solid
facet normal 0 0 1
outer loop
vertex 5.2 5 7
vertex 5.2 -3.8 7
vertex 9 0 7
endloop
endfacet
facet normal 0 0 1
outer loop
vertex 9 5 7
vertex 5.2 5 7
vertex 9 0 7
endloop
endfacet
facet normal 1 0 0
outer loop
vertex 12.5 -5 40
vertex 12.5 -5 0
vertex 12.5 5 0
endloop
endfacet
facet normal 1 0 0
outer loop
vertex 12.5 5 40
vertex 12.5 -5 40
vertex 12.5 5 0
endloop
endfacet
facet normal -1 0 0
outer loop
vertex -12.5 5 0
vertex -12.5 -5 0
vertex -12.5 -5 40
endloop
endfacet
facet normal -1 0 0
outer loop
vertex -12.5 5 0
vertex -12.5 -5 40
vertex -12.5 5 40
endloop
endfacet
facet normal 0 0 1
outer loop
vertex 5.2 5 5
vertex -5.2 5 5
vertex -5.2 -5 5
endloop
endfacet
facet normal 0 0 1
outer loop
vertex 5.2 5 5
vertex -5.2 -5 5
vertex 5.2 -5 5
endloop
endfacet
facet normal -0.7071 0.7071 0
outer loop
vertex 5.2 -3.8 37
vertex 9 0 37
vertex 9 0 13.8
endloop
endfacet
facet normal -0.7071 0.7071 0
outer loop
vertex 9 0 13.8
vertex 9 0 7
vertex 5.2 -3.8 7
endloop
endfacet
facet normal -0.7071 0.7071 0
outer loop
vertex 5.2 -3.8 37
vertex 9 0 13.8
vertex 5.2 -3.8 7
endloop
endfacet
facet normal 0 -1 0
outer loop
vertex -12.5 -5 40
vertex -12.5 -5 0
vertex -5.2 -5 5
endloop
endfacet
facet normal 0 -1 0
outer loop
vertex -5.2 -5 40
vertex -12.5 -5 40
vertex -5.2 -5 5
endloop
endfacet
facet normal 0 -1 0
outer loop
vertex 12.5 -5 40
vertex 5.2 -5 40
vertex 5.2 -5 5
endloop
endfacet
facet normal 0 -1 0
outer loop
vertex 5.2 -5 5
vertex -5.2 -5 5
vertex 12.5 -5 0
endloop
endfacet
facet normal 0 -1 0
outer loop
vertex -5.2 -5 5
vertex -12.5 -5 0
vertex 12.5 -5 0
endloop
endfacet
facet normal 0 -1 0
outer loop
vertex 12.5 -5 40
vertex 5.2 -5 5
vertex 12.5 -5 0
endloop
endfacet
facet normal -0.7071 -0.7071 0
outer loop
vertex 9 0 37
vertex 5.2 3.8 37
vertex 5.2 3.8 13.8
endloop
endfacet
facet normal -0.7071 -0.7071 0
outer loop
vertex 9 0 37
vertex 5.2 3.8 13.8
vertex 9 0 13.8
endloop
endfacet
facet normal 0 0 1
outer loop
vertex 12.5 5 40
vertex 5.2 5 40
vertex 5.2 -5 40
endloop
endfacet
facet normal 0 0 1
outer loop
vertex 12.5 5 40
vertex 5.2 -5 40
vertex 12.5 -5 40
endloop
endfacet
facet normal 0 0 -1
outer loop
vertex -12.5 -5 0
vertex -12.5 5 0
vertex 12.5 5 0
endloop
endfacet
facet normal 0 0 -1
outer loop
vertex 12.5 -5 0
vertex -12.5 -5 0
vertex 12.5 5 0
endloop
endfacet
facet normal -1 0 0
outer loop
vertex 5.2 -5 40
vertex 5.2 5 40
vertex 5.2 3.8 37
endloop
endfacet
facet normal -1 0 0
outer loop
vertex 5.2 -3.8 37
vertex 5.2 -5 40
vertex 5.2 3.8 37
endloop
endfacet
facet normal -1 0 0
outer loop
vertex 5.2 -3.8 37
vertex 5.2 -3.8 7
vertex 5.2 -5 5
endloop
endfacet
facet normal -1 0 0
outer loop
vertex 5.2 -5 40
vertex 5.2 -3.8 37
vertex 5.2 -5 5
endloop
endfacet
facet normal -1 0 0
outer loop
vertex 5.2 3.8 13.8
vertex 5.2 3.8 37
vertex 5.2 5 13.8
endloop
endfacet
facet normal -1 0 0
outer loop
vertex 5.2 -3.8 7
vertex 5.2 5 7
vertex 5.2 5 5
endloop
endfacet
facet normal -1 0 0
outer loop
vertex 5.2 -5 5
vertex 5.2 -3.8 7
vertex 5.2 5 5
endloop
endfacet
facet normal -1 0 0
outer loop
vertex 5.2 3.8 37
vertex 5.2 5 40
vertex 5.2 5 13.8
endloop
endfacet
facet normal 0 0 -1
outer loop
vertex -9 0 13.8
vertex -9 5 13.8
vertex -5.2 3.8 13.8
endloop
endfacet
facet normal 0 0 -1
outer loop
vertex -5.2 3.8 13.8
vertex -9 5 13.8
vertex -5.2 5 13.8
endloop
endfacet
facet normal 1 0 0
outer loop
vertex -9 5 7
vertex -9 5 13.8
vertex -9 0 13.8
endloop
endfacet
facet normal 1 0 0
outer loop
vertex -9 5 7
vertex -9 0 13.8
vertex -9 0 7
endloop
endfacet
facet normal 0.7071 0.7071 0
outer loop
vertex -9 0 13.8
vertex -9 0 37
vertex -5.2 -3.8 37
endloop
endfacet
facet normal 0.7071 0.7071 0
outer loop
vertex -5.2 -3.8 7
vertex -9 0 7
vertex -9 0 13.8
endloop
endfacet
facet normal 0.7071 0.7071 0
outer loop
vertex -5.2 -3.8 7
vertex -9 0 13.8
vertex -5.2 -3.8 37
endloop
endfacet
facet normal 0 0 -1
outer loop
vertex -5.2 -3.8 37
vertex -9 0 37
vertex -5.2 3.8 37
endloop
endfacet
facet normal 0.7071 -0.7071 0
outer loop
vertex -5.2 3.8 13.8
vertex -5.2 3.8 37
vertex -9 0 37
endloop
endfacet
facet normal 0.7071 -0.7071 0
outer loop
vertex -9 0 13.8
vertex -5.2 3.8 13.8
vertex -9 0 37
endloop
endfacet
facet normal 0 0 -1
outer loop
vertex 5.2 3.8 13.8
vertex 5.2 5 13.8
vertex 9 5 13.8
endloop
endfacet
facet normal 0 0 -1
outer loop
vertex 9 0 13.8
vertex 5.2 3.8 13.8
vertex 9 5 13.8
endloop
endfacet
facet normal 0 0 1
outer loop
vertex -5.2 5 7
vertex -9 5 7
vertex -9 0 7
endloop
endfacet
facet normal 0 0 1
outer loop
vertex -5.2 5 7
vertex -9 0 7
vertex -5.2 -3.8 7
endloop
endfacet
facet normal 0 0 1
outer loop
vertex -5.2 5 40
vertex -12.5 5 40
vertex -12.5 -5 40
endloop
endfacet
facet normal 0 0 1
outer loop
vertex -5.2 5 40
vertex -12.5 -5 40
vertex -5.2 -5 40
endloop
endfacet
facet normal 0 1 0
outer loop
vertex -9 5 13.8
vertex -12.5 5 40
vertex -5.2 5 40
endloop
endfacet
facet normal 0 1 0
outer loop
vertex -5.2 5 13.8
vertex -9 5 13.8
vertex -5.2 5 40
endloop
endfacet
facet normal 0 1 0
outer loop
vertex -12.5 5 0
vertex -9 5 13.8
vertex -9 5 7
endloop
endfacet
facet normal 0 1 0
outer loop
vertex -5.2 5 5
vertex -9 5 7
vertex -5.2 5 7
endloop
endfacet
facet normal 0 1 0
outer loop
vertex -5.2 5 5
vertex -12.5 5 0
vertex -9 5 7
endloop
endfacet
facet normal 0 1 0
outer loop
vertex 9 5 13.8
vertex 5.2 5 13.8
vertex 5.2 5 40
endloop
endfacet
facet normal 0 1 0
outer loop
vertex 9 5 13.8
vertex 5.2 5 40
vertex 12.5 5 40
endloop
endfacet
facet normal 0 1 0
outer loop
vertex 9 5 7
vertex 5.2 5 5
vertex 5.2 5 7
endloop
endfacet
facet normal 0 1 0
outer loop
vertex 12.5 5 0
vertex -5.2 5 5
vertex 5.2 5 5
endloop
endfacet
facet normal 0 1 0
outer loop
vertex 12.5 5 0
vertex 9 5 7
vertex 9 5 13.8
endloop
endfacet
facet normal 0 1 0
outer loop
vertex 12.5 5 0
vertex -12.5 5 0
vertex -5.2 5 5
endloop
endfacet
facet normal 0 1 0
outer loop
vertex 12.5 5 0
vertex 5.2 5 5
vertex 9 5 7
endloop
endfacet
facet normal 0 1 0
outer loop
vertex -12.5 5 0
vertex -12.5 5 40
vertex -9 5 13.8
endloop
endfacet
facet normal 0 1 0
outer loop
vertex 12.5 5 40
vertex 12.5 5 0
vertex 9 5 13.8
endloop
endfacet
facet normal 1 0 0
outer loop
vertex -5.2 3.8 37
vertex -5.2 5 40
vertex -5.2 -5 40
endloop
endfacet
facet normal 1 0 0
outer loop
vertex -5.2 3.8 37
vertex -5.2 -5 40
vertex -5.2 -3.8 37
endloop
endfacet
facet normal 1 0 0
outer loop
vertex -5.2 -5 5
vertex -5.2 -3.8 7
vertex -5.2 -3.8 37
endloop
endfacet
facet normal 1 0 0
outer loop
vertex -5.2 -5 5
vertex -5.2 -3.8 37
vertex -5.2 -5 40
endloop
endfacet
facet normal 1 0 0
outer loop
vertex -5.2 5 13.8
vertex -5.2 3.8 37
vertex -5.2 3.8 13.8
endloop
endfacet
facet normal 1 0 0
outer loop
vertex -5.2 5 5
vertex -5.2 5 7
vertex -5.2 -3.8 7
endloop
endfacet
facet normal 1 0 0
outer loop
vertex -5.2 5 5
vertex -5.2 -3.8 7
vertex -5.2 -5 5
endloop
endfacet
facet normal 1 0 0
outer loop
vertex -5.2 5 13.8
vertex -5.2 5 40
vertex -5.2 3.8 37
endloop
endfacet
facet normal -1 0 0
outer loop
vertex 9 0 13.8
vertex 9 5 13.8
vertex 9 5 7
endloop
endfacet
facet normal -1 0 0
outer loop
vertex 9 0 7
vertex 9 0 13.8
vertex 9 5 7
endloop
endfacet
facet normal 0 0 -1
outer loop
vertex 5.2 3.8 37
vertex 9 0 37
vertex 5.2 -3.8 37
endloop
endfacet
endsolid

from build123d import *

# Parameters (mm, degrees)
SKETCH2_W           = 25
SKETCH2_H           = 10
BOSS_EXTRUDE1_DEPTH = 40
SKETCH3_W           = 10.4
SKETCH3_H           = 35
CUT_EXTRUDE1_DEPTH  = 44.084219849
SKETCH4_W           = 18
SKETCH4_H           = 6.8
CUT_EXTRUDE2_DEPTH  = 5
CUT_EXTRUDE3_DEPTH  = 30


with BuildPart() as part:
    # Sketch2 → Boss-Extrude1 (new body)
    with BuildSketch(Plane.XY):
        Rectangle(SKETCH2_W, SKETCH2_H)
    extrude(amount=BOSS_EXTRUDE1_DEPTH)

    # Sketch3 → Cut-Extrude1 (cut, through all)
    with BuildSketch(Plane(origin=(0, 5, 0), x_dir=(1, 0, 0), z_dir=(0, 1, 0))):
        with Locations((0, -22.5)):
            Rectangle(SKETCH3_W, SKETCH3_H)
    extrude(amount=-CUT_EXTRUDE1_DEPTH, mode=Mode.SUBTRACT)

    # Sketch4 → Cut-Extrude2 (cut)
    with BuildSketch(Plane(origin=(0, 5, 0), x_dir=(1, 0, 0), z_dir=(0, 1, 0))):
        with Locations((0, -10.4)):
            Rectangle(SKETCH4_W, SKETCH4_H)
    extrude(amount=-CUT_EXTRUDE2_DEPTH, mode=Mode.SUBTRACT)

    # Sketch5 → Cut-Extrude3 (cut)
    with BuildSketch(Plane.XY.offset(7)):
        Polygon((5.2, 3.8), (9, 0), (5.2, -3.8), align=None)
        Polygon((-5.2, -3.8), (-5.2, 3.8), (-9, 0), align=None)
    extrude(amount=CUT_EXTRUDE3_DEPTH, mode=Mode.SUBTRACT)


solid = part.part
